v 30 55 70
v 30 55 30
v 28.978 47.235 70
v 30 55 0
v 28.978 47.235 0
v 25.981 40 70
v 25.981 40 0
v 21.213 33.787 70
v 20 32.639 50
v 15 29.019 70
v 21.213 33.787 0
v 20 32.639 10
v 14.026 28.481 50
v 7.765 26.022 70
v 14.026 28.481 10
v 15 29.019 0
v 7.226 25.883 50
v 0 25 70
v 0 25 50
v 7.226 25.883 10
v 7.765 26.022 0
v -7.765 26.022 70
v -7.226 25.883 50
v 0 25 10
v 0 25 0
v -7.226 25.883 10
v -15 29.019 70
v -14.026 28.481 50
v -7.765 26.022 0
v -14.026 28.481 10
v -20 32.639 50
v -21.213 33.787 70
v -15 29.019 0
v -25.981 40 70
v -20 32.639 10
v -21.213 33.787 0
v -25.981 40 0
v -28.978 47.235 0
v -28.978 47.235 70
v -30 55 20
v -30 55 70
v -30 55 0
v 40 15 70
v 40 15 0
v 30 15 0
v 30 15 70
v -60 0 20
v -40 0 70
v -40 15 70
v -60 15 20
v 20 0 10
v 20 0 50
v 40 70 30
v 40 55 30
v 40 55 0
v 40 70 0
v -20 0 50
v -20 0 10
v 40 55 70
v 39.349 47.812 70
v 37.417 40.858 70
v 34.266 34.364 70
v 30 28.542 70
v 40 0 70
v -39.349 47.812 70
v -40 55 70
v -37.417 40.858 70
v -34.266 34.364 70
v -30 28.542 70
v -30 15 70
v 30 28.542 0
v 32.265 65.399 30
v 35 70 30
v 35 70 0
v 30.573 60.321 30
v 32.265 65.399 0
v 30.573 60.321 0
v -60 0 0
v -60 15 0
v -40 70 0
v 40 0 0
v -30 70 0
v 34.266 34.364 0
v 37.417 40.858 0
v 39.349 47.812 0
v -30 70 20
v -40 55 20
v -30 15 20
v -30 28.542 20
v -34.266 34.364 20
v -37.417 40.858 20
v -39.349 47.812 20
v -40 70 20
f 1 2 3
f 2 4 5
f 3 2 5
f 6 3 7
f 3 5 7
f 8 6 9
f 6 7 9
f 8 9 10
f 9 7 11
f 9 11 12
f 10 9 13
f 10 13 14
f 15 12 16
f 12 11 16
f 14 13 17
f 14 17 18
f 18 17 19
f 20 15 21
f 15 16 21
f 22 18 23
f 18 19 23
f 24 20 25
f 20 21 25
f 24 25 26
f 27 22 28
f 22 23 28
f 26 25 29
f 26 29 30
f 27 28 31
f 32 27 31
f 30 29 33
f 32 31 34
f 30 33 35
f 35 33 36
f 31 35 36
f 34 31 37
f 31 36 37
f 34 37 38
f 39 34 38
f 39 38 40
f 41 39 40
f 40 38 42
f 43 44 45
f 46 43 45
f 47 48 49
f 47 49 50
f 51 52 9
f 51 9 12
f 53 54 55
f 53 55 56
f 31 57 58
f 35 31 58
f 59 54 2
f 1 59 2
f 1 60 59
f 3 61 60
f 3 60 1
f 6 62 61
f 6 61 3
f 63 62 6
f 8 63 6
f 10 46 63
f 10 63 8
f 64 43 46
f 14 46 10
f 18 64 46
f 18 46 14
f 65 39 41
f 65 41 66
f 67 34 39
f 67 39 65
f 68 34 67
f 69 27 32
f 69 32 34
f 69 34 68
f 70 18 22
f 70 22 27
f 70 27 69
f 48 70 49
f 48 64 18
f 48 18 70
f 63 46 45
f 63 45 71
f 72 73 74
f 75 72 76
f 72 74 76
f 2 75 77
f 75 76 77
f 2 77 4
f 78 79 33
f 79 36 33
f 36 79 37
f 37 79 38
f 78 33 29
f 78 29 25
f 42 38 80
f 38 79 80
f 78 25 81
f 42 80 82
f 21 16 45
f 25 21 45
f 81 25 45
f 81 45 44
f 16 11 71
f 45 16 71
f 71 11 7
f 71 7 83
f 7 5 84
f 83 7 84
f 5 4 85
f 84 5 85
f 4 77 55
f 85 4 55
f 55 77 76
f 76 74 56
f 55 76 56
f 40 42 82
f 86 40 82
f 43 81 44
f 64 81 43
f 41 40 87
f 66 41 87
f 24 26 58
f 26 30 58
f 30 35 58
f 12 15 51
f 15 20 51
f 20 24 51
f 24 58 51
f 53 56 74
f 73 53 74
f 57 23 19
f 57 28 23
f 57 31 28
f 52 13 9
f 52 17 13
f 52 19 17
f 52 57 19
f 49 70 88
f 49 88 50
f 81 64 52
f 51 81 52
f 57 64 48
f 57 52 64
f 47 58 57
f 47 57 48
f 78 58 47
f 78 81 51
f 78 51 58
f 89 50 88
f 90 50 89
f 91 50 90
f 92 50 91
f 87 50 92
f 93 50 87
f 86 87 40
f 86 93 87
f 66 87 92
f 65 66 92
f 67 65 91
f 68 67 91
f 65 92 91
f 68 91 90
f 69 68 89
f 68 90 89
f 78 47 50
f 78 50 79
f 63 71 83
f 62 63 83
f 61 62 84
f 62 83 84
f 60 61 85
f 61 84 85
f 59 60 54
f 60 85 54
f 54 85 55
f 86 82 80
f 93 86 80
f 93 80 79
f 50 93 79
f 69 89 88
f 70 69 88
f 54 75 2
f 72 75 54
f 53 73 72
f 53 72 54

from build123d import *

# Parameters (mm, degrees)
BOSS_EXTRUDE1_DEPTH = 15
BOSS_EXTRUDE2_DEPTH = 70
BOSS_EXTRUDE3_DEPTH = 20
BOSS_EXTRUDE4_DEPTH = 30
CUT_EXTRUDE1_DEPTH  = 116.758369028
SKETCH6_W           = 40
SKETCH6_H           = 40
CUT_EXTRUDE2_DEPTH  = 116.758369028


with BuildPart() as part:
    # Sketch1 → Boss-Extrude1 (new body)
    with BuildSketch(Plane(origin=(0, 0, 0), x_dir=(1, 0, 0), z_dir=(0, 1, 0))):
        Polygon((-60, 0), (40, 0), (40, -70), (-40, -70), (-60, -20), align=None)
    extrude(amount=BOSS_EXTRUDE1_DEPTH)

    # Sketch2 → Boss-Extrude2 (add)
    with BuildSketch(Plane.XY):
        with BuildLine():
            Line((-30, 10), (30, 10))
            Line((30, 10), (30, 28.542486889))
            ThreePointArc((30, 28.542486889), (37.416573868, 40.857864376), (40, 55))
            Line((40, 55), (-40, 55))
            ThreePointArc((-40, 55), (-37.416573868, 40.857864376), (-30, 28.542486889))
            Line((-30, 28.542486889), (-30, 10))
        make_face()
    extrude(amount=BOSS_EXTRUDE2_DEPTH)

    # Sketch3 → Boss-Extrude3 (add)
    with BuildSketch(Plane.XY):
        Polygon((-60, 15), (-30, 15), (-30, 70), (-40, 70), align=None)
    extrude(amount=BOSS_EXTRUDE3_DEPTH)

    # Sketch4 → Boss-Extrude4 (add)
    with BuildSketch(Plane.XY):
        with BuildLine():
            Line((30, 55), (40, 55))
            Line((40, 55), (40, 70))
            Line((40, 70), (35, 70))
            ThreePointArc((35, 70), (31.282917549, 62.90569415), (30, 55))
        make_face()
    extrude(amount=BOSS_EXTRUDE4_DEPTH)

    # Sketch5 → Cut-Extrude1 (cut, through all)
    with BuildSketch(Plane.XY):
        with BuildLine():
            Line((-30, 55), (30, 55))
            ThreePointArc((30, 55), (0, 25), (-30, 55))
        make_face()
    extrude(amount=CUT_EXTRUDE1_DEPTH, mode=Mode.SUBTRACT)

    # Sketch6 → Cut-Extrude2 (cut, through all)
    with BuildSketch(Plane(origin=(0, 0, 0), x_dir=(1, 0, 0), z_dir=(0, 1, 0))):
        with Locations((0, -30)):
            Rectangle(SKETCH6_W, SKETCH6_H)
    extrude(amount=CUT_EXTRUDE2_DEPTH, mode=Mode.SUBTRACT)


solid = part.part
